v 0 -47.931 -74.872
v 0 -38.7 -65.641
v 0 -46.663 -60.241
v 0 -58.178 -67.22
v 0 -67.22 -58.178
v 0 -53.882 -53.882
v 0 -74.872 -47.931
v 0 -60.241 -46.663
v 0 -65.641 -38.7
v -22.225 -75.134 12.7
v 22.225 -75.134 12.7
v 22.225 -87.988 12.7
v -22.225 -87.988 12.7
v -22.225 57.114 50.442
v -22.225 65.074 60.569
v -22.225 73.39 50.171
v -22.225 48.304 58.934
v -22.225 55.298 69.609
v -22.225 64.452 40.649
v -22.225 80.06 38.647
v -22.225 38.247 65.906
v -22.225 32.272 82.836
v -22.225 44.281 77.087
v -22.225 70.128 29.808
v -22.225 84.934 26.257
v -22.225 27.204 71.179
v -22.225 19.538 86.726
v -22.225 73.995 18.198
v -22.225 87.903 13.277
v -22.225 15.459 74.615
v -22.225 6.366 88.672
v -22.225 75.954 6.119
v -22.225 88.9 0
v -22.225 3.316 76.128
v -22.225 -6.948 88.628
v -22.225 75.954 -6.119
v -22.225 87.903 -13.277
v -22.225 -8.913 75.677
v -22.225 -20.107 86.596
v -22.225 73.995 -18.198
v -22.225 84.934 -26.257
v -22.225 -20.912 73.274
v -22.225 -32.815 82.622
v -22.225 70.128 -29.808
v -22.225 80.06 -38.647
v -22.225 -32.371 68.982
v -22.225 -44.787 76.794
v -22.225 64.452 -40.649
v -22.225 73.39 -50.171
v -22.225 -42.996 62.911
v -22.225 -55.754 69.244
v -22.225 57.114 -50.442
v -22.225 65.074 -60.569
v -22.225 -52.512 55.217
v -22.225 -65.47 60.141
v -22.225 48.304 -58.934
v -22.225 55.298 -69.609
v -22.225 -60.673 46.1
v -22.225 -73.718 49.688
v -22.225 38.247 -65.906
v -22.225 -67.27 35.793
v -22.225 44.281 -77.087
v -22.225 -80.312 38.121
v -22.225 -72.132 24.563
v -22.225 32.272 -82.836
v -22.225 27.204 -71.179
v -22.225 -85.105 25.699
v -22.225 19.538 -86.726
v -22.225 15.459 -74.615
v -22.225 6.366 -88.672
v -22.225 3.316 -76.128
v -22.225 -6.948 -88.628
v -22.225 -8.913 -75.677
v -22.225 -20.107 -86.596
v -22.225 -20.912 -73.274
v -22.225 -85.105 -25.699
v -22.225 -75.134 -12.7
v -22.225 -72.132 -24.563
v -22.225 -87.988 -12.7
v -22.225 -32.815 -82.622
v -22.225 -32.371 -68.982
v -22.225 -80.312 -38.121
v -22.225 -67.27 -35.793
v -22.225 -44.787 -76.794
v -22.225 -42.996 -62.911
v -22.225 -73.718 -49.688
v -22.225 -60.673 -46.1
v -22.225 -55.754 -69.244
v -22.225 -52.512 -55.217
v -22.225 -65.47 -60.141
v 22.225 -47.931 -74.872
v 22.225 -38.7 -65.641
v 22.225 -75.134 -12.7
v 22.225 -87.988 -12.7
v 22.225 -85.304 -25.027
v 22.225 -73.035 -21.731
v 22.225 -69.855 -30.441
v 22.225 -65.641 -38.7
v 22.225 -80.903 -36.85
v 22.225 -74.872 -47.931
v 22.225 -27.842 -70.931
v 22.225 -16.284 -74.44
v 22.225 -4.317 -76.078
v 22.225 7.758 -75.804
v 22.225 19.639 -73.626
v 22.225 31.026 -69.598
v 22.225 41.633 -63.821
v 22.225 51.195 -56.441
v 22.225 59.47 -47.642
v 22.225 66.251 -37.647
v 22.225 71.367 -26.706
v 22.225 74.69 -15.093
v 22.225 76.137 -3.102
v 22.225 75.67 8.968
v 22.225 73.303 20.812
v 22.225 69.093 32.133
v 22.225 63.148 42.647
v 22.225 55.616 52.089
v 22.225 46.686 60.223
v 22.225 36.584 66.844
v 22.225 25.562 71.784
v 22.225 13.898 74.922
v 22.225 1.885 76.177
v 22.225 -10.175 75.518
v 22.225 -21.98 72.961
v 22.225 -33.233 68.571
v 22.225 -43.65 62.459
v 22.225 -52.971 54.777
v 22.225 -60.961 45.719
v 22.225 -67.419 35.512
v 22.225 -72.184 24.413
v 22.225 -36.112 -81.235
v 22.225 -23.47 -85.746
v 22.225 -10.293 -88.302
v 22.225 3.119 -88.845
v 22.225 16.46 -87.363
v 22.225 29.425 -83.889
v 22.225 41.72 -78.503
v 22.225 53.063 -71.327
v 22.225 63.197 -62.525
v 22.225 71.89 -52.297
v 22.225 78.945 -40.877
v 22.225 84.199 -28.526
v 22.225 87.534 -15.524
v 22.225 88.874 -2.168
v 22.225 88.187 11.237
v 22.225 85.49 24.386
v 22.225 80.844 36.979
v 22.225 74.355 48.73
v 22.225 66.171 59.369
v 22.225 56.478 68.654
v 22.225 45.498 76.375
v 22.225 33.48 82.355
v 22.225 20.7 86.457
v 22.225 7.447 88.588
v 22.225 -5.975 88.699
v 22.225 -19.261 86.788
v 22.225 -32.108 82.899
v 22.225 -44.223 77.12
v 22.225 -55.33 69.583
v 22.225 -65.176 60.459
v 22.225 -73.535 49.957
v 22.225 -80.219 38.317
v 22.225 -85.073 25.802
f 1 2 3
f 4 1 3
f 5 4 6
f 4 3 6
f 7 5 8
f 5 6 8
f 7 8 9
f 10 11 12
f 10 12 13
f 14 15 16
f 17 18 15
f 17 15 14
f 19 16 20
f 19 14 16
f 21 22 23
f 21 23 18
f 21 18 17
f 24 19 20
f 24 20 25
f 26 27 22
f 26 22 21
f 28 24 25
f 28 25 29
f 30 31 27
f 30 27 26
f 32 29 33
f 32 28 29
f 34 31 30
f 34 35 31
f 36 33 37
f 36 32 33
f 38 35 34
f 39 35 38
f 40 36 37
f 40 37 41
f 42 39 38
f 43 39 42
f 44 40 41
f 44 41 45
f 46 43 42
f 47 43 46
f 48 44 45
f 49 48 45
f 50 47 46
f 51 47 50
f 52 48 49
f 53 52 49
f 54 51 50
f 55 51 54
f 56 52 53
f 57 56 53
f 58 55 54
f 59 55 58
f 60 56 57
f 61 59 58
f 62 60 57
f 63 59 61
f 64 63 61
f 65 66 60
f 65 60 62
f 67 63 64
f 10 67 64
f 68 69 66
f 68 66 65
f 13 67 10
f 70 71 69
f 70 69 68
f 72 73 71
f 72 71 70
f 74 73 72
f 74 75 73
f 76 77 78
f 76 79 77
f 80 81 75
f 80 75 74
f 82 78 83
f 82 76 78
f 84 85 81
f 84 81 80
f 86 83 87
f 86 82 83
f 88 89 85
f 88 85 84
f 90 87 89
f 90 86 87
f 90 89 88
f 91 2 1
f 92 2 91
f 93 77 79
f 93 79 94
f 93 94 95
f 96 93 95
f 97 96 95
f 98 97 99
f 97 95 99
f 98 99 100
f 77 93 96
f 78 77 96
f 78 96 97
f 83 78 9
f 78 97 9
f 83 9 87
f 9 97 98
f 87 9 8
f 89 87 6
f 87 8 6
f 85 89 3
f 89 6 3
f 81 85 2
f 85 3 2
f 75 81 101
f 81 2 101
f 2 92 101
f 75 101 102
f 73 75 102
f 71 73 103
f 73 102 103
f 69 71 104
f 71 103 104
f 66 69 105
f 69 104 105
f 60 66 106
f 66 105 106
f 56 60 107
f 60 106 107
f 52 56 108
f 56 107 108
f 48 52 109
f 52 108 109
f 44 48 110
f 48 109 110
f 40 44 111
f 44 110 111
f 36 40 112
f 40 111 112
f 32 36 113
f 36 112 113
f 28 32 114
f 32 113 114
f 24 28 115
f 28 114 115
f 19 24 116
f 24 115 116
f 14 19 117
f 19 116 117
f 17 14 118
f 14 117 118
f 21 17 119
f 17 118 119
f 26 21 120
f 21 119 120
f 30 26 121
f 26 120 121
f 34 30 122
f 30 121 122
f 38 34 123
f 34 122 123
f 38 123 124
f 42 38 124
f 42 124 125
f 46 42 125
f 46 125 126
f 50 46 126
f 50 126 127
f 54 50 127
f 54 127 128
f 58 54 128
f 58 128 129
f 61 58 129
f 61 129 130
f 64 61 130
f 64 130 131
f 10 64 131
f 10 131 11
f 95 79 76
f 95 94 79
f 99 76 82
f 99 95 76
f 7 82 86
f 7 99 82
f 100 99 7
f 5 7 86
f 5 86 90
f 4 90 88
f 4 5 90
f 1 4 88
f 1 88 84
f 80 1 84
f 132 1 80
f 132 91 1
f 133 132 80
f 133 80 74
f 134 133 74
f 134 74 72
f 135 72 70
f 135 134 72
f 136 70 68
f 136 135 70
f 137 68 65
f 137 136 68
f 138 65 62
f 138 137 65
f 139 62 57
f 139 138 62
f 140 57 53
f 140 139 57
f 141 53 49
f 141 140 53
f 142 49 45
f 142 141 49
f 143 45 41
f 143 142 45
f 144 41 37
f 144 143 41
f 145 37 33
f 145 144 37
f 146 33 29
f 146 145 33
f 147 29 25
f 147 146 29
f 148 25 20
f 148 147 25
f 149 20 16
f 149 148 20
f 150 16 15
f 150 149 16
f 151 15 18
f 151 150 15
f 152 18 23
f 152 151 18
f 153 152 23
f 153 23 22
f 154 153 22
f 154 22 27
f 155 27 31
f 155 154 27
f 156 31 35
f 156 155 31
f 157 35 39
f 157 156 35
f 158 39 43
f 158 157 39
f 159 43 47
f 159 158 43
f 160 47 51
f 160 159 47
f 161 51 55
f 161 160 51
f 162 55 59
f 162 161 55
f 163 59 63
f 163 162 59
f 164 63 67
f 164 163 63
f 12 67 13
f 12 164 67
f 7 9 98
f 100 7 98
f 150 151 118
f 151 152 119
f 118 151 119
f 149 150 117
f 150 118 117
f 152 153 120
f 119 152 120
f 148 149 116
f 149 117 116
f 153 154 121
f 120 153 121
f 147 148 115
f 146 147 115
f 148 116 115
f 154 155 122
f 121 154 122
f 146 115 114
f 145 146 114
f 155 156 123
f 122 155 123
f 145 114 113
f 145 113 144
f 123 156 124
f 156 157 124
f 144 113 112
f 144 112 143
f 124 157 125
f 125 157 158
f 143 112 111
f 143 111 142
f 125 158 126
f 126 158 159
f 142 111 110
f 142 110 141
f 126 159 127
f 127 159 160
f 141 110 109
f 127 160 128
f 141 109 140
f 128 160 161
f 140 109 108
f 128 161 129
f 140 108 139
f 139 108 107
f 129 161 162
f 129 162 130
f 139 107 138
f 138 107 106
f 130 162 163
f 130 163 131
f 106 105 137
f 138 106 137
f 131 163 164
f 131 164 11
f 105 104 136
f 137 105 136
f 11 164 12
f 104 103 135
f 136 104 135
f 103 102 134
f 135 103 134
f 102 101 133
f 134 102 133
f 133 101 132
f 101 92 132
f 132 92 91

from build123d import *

# Parameters (mm, degrees)
F0_W     = 44.45
F0_H     = 12.7
F2_W     = 31.75
F2_H     = 25.4
F3_DEPTH = 88.901
F5_W     = 22.225
F5_H     = 38.1
F6_DEPTH = 125.0798323142


with BuildPart() as f1:
    # F0 (on Front) → F1 (revolve)
    with BuildSketch(Plane.XZ):
        with Locations((0, 82.55)):
            Rectangle(F0_W, F0_H)
    revolve(axis=Axis((0, 0, 0), (1, 0, 0)))

    # F2 (on Front) → F3 (cut, through all)
    with BuildSketch(Plane.XZ):
        with Locations((15.875, 0)):
            Rectangle(F2_W, F2_H)
        with Locations((-15.875, 0)):
            Rectangle(F2_W, F2_H)
    extrude(amount=F3_DEPTH, mode=Mode.SUBTRACT)

    # F5 (on face) → F6 (cut, through all)
    with BuildSketch(Plane(origin=(0, 0, 0), x_dir=(1, 0, 0), z_dir=(0, -0.7071067812, -0.7071067812))):
        with Locations((11.1125, 0)):
            Rectangle(F5_W, F5_H)
    extrude(amount=F6_DEPTH, mode=Mode.SUBTRACT)


solid = f1.part
